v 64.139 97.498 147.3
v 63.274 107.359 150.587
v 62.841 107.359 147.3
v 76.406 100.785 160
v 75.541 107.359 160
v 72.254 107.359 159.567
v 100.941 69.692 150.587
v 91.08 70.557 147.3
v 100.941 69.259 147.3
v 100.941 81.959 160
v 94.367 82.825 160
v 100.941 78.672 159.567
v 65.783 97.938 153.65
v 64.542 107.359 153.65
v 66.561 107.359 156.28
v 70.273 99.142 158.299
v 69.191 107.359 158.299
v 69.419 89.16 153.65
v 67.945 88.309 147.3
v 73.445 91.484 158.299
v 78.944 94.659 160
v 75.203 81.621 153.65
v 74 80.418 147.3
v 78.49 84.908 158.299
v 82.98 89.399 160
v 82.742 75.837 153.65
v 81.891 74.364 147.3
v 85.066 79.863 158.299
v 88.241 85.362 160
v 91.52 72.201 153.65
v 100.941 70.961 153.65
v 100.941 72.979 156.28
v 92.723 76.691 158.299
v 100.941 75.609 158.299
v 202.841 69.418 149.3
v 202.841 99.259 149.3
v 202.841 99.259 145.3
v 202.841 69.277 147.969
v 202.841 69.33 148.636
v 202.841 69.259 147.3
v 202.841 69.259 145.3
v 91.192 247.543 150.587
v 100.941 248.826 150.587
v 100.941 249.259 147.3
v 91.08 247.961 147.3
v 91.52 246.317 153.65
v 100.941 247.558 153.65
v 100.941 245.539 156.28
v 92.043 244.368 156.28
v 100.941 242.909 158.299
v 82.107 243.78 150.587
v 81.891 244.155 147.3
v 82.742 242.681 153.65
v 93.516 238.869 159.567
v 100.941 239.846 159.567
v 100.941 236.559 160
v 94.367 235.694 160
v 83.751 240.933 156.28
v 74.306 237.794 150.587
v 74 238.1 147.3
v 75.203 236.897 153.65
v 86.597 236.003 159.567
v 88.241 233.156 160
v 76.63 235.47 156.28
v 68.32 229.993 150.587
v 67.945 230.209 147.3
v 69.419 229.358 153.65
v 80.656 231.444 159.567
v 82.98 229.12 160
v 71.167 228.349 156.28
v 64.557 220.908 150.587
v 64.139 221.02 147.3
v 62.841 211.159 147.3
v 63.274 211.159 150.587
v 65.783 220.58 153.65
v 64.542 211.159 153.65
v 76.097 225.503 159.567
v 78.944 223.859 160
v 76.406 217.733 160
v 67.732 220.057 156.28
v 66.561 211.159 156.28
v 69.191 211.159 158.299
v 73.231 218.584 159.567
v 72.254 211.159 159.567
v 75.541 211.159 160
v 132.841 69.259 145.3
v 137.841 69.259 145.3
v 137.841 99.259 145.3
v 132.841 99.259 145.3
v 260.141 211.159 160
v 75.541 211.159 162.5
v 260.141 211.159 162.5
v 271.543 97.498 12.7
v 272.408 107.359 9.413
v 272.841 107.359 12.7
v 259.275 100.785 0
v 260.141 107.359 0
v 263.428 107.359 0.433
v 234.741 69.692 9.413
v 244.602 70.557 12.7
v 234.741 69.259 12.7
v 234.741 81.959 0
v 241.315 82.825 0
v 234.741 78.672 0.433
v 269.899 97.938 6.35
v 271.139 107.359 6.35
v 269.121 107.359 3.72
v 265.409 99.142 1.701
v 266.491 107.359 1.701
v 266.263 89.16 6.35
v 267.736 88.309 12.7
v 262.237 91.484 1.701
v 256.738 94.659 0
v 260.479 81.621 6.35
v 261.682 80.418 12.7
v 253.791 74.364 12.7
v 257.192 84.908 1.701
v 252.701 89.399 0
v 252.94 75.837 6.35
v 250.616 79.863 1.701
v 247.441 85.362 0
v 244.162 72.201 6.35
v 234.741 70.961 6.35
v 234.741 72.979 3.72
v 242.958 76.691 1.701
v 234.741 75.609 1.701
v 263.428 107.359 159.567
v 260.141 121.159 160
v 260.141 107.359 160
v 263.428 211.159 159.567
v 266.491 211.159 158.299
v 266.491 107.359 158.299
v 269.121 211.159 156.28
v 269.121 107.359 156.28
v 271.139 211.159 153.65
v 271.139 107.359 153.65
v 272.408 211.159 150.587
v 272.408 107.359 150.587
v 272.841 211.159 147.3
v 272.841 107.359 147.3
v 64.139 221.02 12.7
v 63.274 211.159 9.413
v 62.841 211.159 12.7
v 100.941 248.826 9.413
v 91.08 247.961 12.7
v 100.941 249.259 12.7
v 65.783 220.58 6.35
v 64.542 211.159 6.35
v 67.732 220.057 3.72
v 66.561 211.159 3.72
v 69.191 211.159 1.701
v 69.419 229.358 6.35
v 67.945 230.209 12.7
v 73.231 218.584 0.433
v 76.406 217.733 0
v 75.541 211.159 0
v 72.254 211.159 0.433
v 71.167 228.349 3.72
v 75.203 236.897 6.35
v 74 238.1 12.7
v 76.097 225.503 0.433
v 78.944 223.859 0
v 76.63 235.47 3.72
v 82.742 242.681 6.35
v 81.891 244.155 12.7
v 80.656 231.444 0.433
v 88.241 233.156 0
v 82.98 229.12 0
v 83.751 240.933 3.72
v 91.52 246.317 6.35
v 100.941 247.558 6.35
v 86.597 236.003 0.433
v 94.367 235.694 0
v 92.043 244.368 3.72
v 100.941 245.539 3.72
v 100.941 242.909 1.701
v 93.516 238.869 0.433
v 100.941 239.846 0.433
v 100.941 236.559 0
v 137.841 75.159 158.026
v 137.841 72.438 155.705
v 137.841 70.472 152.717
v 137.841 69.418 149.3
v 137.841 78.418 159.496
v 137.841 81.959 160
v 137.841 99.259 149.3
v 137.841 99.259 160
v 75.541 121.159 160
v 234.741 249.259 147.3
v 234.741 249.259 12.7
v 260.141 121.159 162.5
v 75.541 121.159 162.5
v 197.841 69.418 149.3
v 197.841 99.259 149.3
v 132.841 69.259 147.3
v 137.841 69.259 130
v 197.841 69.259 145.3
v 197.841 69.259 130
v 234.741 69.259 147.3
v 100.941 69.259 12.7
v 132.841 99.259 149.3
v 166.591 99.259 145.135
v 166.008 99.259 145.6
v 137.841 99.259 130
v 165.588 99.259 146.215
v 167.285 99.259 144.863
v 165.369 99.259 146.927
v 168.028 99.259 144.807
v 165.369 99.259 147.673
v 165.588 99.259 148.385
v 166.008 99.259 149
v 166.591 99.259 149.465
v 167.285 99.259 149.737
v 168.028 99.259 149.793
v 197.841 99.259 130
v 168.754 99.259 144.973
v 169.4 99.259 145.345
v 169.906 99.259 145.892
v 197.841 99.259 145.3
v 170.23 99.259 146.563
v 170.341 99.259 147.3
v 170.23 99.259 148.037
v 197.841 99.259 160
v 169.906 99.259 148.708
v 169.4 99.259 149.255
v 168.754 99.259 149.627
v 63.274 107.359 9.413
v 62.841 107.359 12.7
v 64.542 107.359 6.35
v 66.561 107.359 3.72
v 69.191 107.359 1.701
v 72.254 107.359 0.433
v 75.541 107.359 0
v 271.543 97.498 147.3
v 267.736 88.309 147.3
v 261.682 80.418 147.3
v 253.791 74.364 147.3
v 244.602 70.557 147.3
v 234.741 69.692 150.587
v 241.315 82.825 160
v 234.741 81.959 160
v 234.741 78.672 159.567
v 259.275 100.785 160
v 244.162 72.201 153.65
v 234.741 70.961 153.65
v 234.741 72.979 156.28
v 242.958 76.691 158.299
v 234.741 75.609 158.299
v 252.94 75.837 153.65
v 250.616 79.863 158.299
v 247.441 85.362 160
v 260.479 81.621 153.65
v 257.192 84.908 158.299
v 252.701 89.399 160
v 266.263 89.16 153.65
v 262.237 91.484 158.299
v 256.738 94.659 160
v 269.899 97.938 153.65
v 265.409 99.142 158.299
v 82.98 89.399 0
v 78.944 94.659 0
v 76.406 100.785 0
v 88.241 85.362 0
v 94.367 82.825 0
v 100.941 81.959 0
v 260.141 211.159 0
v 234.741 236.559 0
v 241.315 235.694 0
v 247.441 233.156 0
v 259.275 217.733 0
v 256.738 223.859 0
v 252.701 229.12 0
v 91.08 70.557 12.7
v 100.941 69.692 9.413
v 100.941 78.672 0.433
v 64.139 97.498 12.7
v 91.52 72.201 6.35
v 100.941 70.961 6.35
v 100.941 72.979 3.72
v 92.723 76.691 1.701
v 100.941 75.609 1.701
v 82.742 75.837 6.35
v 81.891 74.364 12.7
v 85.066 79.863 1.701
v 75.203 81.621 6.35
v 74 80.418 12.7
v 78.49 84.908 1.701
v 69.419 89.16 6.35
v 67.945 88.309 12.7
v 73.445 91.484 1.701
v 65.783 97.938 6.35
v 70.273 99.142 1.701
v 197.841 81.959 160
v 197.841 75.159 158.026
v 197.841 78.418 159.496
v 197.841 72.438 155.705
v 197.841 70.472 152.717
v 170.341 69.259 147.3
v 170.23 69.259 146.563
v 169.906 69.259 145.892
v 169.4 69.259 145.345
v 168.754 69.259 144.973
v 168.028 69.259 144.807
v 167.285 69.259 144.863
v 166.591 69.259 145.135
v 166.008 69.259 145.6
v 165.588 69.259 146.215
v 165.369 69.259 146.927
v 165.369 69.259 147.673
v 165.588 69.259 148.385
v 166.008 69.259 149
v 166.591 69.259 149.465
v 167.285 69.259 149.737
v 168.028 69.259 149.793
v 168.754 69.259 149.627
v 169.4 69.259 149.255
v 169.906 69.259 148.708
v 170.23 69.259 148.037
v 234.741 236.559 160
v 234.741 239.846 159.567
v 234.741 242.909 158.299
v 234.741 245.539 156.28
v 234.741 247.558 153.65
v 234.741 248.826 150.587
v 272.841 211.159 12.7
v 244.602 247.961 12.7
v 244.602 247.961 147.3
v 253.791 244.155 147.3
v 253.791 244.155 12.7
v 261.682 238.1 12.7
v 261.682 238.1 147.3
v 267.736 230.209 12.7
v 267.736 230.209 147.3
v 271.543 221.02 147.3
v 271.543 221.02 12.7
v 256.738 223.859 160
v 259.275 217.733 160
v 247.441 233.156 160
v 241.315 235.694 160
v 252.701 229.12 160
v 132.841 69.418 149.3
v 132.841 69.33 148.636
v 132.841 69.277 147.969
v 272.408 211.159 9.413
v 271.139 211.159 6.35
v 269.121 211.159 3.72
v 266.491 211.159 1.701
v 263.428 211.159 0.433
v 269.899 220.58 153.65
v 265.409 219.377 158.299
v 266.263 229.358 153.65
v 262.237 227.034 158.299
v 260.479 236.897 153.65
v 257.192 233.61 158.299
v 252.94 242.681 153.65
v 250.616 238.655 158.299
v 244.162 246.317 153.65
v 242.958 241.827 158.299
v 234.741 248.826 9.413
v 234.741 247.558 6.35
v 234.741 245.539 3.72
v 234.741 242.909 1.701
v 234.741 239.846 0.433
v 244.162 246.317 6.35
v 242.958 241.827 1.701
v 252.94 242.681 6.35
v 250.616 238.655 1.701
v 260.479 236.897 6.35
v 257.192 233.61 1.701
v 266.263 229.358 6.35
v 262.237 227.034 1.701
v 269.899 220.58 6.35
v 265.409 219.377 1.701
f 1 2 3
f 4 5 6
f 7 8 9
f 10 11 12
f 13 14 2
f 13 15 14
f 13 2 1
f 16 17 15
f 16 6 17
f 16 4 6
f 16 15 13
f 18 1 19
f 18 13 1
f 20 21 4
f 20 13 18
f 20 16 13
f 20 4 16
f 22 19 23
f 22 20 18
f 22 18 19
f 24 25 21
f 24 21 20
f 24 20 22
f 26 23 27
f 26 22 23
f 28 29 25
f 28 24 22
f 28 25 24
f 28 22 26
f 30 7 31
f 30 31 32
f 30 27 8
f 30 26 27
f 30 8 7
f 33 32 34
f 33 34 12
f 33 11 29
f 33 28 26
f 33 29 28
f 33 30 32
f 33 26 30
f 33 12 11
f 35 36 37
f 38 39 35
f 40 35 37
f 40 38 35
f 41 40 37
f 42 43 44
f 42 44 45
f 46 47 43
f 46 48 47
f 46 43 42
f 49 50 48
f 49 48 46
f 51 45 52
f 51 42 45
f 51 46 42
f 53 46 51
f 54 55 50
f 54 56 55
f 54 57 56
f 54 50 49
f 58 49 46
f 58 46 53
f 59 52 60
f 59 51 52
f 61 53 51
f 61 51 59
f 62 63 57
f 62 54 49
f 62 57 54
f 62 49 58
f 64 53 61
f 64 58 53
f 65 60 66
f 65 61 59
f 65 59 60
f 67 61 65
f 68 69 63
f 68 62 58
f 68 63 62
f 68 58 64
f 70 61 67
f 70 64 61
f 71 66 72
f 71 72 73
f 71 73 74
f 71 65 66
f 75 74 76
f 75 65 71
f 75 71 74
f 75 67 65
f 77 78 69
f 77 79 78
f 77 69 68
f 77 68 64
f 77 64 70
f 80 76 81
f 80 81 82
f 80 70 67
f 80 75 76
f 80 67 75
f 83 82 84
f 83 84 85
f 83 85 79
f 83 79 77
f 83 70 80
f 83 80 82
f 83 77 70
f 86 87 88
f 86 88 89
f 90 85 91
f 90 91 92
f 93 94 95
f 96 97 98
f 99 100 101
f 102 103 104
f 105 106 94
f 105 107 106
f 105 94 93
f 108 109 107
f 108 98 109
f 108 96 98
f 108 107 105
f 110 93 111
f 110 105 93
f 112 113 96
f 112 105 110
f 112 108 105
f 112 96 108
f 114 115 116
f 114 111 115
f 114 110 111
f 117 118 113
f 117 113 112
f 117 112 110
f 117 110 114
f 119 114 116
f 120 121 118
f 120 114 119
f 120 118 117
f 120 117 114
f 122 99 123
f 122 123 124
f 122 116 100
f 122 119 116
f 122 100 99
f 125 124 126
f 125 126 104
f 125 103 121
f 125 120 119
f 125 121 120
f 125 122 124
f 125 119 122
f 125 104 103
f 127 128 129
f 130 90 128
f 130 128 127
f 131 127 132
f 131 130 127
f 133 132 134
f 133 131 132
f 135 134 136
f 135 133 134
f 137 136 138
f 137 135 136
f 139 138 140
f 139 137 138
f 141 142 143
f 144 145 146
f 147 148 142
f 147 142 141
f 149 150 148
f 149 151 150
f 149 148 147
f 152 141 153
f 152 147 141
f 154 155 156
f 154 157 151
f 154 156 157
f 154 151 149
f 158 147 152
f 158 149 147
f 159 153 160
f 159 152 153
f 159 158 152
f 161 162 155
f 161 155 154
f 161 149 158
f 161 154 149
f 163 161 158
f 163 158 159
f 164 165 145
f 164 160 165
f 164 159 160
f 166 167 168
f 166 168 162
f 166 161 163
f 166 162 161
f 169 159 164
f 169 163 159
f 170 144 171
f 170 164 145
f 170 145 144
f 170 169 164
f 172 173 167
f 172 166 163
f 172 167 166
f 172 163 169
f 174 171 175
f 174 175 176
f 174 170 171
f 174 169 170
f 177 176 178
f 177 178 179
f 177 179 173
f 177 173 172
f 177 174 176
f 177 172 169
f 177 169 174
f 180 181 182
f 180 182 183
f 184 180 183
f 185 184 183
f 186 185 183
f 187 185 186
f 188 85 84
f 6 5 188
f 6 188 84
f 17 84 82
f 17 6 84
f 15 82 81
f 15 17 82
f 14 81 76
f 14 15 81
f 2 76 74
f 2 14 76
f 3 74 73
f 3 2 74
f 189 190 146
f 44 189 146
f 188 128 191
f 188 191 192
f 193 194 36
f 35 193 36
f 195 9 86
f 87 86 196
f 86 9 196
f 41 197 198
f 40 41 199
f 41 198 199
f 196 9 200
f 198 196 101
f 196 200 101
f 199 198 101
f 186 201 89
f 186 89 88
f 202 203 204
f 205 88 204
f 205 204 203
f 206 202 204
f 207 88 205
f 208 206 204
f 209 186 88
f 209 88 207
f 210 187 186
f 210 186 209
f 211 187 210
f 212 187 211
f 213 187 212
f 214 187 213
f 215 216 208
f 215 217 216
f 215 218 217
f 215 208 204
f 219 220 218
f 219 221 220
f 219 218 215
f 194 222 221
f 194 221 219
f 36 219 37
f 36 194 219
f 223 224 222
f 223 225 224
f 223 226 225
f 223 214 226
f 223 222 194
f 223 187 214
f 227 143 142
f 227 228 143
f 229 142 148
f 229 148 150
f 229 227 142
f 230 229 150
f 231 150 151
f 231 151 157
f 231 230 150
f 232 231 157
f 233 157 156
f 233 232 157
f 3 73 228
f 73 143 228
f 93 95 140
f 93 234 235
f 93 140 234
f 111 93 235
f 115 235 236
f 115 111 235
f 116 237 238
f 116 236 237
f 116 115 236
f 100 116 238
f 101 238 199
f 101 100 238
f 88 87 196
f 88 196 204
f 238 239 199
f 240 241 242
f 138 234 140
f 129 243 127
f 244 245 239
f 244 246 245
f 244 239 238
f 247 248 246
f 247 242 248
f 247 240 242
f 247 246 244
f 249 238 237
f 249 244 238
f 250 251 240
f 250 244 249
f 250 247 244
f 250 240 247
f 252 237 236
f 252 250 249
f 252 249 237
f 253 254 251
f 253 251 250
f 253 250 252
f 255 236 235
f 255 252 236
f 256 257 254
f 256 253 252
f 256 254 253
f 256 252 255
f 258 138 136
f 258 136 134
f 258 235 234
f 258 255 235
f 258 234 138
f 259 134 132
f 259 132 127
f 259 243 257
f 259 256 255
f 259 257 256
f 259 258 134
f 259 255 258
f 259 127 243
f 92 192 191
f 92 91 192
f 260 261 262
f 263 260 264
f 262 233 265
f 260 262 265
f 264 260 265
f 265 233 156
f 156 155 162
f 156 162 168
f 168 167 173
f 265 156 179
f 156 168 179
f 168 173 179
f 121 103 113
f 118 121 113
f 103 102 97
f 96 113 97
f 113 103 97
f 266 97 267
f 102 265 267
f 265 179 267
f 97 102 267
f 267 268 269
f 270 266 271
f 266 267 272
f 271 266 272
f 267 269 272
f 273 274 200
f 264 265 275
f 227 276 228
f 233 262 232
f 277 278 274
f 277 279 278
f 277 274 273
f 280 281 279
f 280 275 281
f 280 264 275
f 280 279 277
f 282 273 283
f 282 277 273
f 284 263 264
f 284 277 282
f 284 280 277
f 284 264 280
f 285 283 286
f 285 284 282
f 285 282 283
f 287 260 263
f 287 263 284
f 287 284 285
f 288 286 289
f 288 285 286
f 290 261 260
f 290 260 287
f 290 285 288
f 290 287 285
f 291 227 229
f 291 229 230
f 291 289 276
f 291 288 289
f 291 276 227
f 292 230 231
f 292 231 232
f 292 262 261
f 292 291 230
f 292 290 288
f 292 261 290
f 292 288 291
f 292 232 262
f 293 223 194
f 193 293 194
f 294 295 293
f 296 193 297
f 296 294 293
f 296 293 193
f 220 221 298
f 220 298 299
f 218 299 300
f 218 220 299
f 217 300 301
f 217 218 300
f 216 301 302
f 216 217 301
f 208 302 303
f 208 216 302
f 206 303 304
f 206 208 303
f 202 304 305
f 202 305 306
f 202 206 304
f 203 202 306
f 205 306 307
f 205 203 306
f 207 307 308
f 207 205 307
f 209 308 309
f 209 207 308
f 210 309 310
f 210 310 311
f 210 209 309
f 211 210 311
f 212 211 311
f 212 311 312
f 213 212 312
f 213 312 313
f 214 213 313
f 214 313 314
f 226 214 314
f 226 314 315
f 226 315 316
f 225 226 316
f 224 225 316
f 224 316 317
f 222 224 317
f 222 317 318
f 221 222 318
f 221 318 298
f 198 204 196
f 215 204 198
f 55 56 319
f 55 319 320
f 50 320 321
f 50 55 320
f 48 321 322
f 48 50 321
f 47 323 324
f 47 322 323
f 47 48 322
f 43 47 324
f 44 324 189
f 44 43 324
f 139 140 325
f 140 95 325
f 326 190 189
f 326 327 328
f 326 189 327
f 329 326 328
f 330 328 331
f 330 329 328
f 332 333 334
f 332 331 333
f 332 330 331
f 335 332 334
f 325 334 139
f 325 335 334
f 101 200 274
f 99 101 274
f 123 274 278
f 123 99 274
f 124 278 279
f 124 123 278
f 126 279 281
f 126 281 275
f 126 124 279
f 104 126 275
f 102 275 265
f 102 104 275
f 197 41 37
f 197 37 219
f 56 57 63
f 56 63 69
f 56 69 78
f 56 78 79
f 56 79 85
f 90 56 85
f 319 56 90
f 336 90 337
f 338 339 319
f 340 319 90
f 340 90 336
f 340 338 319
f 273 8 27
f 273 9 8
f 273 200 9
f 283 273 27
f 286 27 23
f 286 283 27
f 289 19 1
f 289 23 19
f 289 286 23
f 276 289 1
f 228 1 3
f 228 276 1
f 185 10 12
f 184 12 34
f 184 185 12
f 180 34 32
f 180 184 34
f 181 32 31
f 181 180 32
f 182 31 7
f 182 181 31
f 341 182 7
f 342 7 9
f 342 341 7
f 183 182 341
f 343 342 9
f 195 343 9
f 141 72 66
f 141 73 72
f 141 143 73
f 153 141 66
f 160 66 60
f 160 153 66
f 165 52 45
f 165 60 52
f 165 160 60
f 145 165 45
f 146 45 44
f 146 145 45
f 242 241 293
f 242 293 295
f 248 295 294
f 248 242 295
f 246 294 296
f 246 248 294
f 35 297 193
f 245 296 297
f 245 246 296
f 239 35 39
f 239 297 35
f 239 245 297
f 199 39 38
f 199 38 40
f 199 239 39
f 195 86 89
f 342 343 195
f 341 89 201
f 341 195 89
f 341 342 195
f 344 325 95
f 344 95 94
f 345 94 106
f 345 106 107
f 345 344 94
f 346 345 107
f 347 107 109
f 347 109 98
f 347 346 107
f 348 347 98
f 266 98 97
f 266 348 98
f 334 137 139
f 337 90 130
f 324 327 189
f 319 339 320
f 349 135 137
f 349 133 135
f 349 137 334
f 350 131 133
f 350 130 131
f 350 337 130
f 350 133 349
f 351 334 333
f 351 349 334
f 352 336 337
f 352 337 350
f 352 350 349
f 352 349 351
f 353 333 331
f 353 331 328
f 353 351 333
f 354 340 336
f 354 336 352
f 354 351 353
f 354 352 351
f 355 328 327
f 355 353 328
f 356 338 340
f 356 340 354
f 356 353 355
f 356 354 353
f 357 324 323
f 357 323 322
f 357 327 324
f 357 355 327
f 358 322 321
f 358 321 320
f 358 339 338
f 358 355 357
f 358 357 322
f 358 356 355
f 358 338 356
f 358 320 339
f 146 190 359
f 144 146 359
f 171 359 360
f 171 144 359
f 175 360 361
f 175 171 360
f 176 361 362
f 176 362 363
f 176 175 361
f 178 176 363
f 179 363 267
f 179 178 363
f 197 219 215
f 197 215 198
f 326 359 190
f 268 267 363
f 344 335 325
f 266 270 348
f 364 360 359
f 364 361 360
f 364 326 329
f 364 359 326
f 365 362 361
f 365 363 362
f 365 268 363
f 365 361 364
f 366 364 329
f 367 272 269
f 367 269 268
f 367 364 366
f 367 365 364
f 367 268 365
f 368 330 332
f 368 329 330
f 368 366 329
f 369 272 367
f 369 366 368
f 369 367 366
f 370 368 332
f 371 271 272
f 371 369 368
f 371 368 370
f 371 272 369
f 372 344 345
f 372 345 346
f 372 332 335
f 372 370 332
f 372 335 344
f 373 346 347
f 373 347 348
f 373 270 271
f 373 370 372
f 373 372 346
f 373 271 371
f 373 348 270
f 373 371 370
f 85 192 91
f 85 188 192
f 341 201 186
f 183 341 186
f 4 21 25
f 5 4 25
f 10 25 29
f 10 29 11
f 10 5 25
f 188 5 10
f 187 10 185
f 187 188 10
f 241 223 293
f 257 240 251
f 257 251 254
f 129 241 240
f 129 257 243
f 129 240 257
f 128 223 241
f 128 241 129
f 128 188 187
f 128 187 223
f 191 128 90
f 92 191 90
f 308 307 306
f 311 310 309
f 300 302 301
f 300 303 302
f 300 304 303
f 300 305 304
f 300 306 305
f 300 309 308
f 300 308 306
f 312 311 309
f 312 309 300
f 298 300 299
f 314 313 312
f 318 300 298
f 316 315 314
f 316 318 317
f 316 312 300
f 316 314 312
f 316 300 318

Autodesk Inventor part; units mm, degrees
ref_plane "YZ Plane" through (0, 0, 0) normal (1, 0, 0) x (0, 1, 0)
ref_plane "XZ Plane" through (0, 0, 0) normal (0, 1, 0) x (-1, 0, 0)
ref_plane "XY Plane" through (0, 0, 0) normal (0, 0, 1) x (1, 0, 0)
sketch "Sketch1" plane through (0, 0, 0) normal (0, 0, 1) x (1, 0, 0)
  line L0 (100.9409, 69.2591) -> (234.7409, 69.2591)
  line L1 (272.8409, 107.3591) -> (272.8409, 211.1591)
  line L2 (234.7409, 249.2591) -> (100.9409, 249.2591)
  line L3 (62.8409, 211.1591) -> (62.8409, 107.3591)
  arc A0 (100.9409, 249.2591) -> (62.8409, 211.1591) centre (100.9409, 211.1591) ccw
  arc A1 (272.8409, 211.1591) -> (234.7409, 249.2591) centre (234.7409, 211.1591) ccw
  arc A2 (234.7409, 69.2591) -> (272.8409, 107.3591) centre (234.7409, 107.3591) ccw
  arc A3 (62.8409, 107.3591) -> (100.9409, 69.2591) centre (100.9409, 107.3591) ccw
  point P0 (0, 0)
  point P1 (62.8409, 69.2591)
  point P2 (272.8409, 249.2591)
  point P3 (272.8409, 69.2591)
  dimension "d0" = 210
  dimension "d1" = 180
  dimension "d2" = 38.1
  dimension "d3" = 38.1
extrude "Extrusion1" add sketch "Sketch1" along normal blind 160
fillet "Fillet1" radius 12.7 16 edges at (261.6817, 238.0999, 0) (167.8409, 249.2591, 0) (74.0001, 238.0999, 0) (62.8409, 159.2591, 0) (74.0001, 80.4183, 0) (167.8409, 69.2591, 0) (261.6817, 80.4183, 0) (272.8409, 159.2591, 0) (261.6817, 238.0999, 160) (167.8409, 249.2591, 160) (74.0001, 238.0999, 160) (62.8409, 159.2591, 160) (74.0001, 80.4183, 160) (167.8409, 69.2591, 160) (261.6817, 80.4183, 160) (272.8409, 159.2591, 160)
sketch "Sketch2" plane through (0, 0, 160) normal (0, 0, 1) x (1, 0, 0)
  line L0 (234.7409, 69.2591) -> (100.9409, 69.2591) projected
  line L1 (137.8409, 99.2591) -> (197.8409, 99.2591)
  line L2 (197.8409, 99.2591) -> (197.8409, 69.2591)
  line L3 (197.8409, 69.2591) -> (137.8409, 69.2591)
  line L4 (137.8409, 69.2591) -> (137.8409, 99.2591)
  line L5 (234.7409, 81.9591) -> (100.9409, 81.9591) projected
  point P0 (0, 0)
  point P1 (167.8409, 99.2591)
  point P2 (167.8409, 81.9591)
  dimension "d7" = 60
  dimension "d8" = 30
extrude "Extrusion2" cut sketch "Sketch2" against normal blind 30
sketch "Sketch3" plane through (137.8409, 99.2591, 160) normal (0, -1, 0) x (1, 0, 0)
  line L0 (96.9, -12.7) -> (-36.9, -12.7) projected
  circle A0 centre (30, -12.7) radius 2.5
  point P0 (-137.8409, -160)
  dimension "d11" = 5
extrude "Extrusion3" add sketch "Sketch3" along normal blind 30
thread "Thread1" size "12-24 UNC" class "2A" standard "ANSI Unified Screw Threads" full length
sketch "Sketch4" plane through (0, 0, 160) normal (0, 0, 1) x (1, 0, 0)
  line L0 (260.1409, 107.3591) -> (260.1409, 211.1591) projected
  line L1 (75.5409, 211.1591) -> (260.1409, 211.1591)
  line L2 (260.1409, 211.1591) -> (260.1409, 121.1591)
  line L3 (260.1409, 121.1591) -> (75.5409, 121.1591)
  line L4 (75.5409, 121.1591) -> (75.5409, 211.1591)
  point P0 (0, 0)
  dimension "d16" = 90
extrude "Extrusion4" add sketch "Sketch4" along normal blind 2.5
sketch "Sketch5" plane through (100.9409, 69.2591, 12.7) normal (0, -1, 0) x (1, 0, 0)
  line L0 (36.9, 134.6) -> (36.9, 147.3) projected
  line L1 (36.9, 147.3) -> (0, 147.3) projected
  line L2 (0, 134.6) -> (0, 147.3) projected
  line L3 (0, 134.6) -> (36.9, 134.6) projected
  line L4 (96.9, 147.3) -> (96.9, 134.6) projected
  line L5 (96.9, 134.6) -> (133.8, 134.6) projected
  line L6 (133.8, 134.6) -> (133.8, 147.3) projected
  line L7 (133.8, 147.3) -> (96.9, 147.3) projected
  line L8 (96.9, 134.6) -> (96.9, 117.3) projected
  line L9 (96.9, 117.3) -> (36.9, 117.3) projected
  line L10 (36.9, 117.3) -> (36.9, 134.6) projected
  line L11 (0, 134.6) -> (36.9, 134.6) projected
  line L12 (0, 0) -> (0, 134.6) projected
  line L13 (133.8, 0) -> (0, 0) projected
  line L14 (133.8, 0) -> (133.8, 134.6) projected
  line L15 (96.9, 134.6) -> (133.8, 134.6) projected
  line L16 (31.9, 136.6) -> (36.9, 136.6)
  line L17 (36.9, 136.6) -> (36.9, 132.6)
  line L18 (36.9, 132.6) -> (31.9, 132.6)
  line L19 (31.9, 132.6) -> (31.9, 136.6)
  line L20 (96.9, 136.6) -> (101.9, 136.6)
  line L21 (101.9, 136.6) -> (101.9, 132.6)
  line L22 (101.9, 132.6) -> (96.9, 132.6)
  line L23 (96.9, 132.6) -> (96.9, 136.6)
  point P0 (-100.9409, -12.7)
  dimension "d19" = 4
  dimension "d20" = 5
extrude "Extrusion5" cut sketch "Sketch5" against normal blind 30 contours L3 L19 L16 L0 | L10 L18 L19 L3 | L8 L5 L21 L22 | L4 L20 L21 L5
properties part number "Robot_face"
